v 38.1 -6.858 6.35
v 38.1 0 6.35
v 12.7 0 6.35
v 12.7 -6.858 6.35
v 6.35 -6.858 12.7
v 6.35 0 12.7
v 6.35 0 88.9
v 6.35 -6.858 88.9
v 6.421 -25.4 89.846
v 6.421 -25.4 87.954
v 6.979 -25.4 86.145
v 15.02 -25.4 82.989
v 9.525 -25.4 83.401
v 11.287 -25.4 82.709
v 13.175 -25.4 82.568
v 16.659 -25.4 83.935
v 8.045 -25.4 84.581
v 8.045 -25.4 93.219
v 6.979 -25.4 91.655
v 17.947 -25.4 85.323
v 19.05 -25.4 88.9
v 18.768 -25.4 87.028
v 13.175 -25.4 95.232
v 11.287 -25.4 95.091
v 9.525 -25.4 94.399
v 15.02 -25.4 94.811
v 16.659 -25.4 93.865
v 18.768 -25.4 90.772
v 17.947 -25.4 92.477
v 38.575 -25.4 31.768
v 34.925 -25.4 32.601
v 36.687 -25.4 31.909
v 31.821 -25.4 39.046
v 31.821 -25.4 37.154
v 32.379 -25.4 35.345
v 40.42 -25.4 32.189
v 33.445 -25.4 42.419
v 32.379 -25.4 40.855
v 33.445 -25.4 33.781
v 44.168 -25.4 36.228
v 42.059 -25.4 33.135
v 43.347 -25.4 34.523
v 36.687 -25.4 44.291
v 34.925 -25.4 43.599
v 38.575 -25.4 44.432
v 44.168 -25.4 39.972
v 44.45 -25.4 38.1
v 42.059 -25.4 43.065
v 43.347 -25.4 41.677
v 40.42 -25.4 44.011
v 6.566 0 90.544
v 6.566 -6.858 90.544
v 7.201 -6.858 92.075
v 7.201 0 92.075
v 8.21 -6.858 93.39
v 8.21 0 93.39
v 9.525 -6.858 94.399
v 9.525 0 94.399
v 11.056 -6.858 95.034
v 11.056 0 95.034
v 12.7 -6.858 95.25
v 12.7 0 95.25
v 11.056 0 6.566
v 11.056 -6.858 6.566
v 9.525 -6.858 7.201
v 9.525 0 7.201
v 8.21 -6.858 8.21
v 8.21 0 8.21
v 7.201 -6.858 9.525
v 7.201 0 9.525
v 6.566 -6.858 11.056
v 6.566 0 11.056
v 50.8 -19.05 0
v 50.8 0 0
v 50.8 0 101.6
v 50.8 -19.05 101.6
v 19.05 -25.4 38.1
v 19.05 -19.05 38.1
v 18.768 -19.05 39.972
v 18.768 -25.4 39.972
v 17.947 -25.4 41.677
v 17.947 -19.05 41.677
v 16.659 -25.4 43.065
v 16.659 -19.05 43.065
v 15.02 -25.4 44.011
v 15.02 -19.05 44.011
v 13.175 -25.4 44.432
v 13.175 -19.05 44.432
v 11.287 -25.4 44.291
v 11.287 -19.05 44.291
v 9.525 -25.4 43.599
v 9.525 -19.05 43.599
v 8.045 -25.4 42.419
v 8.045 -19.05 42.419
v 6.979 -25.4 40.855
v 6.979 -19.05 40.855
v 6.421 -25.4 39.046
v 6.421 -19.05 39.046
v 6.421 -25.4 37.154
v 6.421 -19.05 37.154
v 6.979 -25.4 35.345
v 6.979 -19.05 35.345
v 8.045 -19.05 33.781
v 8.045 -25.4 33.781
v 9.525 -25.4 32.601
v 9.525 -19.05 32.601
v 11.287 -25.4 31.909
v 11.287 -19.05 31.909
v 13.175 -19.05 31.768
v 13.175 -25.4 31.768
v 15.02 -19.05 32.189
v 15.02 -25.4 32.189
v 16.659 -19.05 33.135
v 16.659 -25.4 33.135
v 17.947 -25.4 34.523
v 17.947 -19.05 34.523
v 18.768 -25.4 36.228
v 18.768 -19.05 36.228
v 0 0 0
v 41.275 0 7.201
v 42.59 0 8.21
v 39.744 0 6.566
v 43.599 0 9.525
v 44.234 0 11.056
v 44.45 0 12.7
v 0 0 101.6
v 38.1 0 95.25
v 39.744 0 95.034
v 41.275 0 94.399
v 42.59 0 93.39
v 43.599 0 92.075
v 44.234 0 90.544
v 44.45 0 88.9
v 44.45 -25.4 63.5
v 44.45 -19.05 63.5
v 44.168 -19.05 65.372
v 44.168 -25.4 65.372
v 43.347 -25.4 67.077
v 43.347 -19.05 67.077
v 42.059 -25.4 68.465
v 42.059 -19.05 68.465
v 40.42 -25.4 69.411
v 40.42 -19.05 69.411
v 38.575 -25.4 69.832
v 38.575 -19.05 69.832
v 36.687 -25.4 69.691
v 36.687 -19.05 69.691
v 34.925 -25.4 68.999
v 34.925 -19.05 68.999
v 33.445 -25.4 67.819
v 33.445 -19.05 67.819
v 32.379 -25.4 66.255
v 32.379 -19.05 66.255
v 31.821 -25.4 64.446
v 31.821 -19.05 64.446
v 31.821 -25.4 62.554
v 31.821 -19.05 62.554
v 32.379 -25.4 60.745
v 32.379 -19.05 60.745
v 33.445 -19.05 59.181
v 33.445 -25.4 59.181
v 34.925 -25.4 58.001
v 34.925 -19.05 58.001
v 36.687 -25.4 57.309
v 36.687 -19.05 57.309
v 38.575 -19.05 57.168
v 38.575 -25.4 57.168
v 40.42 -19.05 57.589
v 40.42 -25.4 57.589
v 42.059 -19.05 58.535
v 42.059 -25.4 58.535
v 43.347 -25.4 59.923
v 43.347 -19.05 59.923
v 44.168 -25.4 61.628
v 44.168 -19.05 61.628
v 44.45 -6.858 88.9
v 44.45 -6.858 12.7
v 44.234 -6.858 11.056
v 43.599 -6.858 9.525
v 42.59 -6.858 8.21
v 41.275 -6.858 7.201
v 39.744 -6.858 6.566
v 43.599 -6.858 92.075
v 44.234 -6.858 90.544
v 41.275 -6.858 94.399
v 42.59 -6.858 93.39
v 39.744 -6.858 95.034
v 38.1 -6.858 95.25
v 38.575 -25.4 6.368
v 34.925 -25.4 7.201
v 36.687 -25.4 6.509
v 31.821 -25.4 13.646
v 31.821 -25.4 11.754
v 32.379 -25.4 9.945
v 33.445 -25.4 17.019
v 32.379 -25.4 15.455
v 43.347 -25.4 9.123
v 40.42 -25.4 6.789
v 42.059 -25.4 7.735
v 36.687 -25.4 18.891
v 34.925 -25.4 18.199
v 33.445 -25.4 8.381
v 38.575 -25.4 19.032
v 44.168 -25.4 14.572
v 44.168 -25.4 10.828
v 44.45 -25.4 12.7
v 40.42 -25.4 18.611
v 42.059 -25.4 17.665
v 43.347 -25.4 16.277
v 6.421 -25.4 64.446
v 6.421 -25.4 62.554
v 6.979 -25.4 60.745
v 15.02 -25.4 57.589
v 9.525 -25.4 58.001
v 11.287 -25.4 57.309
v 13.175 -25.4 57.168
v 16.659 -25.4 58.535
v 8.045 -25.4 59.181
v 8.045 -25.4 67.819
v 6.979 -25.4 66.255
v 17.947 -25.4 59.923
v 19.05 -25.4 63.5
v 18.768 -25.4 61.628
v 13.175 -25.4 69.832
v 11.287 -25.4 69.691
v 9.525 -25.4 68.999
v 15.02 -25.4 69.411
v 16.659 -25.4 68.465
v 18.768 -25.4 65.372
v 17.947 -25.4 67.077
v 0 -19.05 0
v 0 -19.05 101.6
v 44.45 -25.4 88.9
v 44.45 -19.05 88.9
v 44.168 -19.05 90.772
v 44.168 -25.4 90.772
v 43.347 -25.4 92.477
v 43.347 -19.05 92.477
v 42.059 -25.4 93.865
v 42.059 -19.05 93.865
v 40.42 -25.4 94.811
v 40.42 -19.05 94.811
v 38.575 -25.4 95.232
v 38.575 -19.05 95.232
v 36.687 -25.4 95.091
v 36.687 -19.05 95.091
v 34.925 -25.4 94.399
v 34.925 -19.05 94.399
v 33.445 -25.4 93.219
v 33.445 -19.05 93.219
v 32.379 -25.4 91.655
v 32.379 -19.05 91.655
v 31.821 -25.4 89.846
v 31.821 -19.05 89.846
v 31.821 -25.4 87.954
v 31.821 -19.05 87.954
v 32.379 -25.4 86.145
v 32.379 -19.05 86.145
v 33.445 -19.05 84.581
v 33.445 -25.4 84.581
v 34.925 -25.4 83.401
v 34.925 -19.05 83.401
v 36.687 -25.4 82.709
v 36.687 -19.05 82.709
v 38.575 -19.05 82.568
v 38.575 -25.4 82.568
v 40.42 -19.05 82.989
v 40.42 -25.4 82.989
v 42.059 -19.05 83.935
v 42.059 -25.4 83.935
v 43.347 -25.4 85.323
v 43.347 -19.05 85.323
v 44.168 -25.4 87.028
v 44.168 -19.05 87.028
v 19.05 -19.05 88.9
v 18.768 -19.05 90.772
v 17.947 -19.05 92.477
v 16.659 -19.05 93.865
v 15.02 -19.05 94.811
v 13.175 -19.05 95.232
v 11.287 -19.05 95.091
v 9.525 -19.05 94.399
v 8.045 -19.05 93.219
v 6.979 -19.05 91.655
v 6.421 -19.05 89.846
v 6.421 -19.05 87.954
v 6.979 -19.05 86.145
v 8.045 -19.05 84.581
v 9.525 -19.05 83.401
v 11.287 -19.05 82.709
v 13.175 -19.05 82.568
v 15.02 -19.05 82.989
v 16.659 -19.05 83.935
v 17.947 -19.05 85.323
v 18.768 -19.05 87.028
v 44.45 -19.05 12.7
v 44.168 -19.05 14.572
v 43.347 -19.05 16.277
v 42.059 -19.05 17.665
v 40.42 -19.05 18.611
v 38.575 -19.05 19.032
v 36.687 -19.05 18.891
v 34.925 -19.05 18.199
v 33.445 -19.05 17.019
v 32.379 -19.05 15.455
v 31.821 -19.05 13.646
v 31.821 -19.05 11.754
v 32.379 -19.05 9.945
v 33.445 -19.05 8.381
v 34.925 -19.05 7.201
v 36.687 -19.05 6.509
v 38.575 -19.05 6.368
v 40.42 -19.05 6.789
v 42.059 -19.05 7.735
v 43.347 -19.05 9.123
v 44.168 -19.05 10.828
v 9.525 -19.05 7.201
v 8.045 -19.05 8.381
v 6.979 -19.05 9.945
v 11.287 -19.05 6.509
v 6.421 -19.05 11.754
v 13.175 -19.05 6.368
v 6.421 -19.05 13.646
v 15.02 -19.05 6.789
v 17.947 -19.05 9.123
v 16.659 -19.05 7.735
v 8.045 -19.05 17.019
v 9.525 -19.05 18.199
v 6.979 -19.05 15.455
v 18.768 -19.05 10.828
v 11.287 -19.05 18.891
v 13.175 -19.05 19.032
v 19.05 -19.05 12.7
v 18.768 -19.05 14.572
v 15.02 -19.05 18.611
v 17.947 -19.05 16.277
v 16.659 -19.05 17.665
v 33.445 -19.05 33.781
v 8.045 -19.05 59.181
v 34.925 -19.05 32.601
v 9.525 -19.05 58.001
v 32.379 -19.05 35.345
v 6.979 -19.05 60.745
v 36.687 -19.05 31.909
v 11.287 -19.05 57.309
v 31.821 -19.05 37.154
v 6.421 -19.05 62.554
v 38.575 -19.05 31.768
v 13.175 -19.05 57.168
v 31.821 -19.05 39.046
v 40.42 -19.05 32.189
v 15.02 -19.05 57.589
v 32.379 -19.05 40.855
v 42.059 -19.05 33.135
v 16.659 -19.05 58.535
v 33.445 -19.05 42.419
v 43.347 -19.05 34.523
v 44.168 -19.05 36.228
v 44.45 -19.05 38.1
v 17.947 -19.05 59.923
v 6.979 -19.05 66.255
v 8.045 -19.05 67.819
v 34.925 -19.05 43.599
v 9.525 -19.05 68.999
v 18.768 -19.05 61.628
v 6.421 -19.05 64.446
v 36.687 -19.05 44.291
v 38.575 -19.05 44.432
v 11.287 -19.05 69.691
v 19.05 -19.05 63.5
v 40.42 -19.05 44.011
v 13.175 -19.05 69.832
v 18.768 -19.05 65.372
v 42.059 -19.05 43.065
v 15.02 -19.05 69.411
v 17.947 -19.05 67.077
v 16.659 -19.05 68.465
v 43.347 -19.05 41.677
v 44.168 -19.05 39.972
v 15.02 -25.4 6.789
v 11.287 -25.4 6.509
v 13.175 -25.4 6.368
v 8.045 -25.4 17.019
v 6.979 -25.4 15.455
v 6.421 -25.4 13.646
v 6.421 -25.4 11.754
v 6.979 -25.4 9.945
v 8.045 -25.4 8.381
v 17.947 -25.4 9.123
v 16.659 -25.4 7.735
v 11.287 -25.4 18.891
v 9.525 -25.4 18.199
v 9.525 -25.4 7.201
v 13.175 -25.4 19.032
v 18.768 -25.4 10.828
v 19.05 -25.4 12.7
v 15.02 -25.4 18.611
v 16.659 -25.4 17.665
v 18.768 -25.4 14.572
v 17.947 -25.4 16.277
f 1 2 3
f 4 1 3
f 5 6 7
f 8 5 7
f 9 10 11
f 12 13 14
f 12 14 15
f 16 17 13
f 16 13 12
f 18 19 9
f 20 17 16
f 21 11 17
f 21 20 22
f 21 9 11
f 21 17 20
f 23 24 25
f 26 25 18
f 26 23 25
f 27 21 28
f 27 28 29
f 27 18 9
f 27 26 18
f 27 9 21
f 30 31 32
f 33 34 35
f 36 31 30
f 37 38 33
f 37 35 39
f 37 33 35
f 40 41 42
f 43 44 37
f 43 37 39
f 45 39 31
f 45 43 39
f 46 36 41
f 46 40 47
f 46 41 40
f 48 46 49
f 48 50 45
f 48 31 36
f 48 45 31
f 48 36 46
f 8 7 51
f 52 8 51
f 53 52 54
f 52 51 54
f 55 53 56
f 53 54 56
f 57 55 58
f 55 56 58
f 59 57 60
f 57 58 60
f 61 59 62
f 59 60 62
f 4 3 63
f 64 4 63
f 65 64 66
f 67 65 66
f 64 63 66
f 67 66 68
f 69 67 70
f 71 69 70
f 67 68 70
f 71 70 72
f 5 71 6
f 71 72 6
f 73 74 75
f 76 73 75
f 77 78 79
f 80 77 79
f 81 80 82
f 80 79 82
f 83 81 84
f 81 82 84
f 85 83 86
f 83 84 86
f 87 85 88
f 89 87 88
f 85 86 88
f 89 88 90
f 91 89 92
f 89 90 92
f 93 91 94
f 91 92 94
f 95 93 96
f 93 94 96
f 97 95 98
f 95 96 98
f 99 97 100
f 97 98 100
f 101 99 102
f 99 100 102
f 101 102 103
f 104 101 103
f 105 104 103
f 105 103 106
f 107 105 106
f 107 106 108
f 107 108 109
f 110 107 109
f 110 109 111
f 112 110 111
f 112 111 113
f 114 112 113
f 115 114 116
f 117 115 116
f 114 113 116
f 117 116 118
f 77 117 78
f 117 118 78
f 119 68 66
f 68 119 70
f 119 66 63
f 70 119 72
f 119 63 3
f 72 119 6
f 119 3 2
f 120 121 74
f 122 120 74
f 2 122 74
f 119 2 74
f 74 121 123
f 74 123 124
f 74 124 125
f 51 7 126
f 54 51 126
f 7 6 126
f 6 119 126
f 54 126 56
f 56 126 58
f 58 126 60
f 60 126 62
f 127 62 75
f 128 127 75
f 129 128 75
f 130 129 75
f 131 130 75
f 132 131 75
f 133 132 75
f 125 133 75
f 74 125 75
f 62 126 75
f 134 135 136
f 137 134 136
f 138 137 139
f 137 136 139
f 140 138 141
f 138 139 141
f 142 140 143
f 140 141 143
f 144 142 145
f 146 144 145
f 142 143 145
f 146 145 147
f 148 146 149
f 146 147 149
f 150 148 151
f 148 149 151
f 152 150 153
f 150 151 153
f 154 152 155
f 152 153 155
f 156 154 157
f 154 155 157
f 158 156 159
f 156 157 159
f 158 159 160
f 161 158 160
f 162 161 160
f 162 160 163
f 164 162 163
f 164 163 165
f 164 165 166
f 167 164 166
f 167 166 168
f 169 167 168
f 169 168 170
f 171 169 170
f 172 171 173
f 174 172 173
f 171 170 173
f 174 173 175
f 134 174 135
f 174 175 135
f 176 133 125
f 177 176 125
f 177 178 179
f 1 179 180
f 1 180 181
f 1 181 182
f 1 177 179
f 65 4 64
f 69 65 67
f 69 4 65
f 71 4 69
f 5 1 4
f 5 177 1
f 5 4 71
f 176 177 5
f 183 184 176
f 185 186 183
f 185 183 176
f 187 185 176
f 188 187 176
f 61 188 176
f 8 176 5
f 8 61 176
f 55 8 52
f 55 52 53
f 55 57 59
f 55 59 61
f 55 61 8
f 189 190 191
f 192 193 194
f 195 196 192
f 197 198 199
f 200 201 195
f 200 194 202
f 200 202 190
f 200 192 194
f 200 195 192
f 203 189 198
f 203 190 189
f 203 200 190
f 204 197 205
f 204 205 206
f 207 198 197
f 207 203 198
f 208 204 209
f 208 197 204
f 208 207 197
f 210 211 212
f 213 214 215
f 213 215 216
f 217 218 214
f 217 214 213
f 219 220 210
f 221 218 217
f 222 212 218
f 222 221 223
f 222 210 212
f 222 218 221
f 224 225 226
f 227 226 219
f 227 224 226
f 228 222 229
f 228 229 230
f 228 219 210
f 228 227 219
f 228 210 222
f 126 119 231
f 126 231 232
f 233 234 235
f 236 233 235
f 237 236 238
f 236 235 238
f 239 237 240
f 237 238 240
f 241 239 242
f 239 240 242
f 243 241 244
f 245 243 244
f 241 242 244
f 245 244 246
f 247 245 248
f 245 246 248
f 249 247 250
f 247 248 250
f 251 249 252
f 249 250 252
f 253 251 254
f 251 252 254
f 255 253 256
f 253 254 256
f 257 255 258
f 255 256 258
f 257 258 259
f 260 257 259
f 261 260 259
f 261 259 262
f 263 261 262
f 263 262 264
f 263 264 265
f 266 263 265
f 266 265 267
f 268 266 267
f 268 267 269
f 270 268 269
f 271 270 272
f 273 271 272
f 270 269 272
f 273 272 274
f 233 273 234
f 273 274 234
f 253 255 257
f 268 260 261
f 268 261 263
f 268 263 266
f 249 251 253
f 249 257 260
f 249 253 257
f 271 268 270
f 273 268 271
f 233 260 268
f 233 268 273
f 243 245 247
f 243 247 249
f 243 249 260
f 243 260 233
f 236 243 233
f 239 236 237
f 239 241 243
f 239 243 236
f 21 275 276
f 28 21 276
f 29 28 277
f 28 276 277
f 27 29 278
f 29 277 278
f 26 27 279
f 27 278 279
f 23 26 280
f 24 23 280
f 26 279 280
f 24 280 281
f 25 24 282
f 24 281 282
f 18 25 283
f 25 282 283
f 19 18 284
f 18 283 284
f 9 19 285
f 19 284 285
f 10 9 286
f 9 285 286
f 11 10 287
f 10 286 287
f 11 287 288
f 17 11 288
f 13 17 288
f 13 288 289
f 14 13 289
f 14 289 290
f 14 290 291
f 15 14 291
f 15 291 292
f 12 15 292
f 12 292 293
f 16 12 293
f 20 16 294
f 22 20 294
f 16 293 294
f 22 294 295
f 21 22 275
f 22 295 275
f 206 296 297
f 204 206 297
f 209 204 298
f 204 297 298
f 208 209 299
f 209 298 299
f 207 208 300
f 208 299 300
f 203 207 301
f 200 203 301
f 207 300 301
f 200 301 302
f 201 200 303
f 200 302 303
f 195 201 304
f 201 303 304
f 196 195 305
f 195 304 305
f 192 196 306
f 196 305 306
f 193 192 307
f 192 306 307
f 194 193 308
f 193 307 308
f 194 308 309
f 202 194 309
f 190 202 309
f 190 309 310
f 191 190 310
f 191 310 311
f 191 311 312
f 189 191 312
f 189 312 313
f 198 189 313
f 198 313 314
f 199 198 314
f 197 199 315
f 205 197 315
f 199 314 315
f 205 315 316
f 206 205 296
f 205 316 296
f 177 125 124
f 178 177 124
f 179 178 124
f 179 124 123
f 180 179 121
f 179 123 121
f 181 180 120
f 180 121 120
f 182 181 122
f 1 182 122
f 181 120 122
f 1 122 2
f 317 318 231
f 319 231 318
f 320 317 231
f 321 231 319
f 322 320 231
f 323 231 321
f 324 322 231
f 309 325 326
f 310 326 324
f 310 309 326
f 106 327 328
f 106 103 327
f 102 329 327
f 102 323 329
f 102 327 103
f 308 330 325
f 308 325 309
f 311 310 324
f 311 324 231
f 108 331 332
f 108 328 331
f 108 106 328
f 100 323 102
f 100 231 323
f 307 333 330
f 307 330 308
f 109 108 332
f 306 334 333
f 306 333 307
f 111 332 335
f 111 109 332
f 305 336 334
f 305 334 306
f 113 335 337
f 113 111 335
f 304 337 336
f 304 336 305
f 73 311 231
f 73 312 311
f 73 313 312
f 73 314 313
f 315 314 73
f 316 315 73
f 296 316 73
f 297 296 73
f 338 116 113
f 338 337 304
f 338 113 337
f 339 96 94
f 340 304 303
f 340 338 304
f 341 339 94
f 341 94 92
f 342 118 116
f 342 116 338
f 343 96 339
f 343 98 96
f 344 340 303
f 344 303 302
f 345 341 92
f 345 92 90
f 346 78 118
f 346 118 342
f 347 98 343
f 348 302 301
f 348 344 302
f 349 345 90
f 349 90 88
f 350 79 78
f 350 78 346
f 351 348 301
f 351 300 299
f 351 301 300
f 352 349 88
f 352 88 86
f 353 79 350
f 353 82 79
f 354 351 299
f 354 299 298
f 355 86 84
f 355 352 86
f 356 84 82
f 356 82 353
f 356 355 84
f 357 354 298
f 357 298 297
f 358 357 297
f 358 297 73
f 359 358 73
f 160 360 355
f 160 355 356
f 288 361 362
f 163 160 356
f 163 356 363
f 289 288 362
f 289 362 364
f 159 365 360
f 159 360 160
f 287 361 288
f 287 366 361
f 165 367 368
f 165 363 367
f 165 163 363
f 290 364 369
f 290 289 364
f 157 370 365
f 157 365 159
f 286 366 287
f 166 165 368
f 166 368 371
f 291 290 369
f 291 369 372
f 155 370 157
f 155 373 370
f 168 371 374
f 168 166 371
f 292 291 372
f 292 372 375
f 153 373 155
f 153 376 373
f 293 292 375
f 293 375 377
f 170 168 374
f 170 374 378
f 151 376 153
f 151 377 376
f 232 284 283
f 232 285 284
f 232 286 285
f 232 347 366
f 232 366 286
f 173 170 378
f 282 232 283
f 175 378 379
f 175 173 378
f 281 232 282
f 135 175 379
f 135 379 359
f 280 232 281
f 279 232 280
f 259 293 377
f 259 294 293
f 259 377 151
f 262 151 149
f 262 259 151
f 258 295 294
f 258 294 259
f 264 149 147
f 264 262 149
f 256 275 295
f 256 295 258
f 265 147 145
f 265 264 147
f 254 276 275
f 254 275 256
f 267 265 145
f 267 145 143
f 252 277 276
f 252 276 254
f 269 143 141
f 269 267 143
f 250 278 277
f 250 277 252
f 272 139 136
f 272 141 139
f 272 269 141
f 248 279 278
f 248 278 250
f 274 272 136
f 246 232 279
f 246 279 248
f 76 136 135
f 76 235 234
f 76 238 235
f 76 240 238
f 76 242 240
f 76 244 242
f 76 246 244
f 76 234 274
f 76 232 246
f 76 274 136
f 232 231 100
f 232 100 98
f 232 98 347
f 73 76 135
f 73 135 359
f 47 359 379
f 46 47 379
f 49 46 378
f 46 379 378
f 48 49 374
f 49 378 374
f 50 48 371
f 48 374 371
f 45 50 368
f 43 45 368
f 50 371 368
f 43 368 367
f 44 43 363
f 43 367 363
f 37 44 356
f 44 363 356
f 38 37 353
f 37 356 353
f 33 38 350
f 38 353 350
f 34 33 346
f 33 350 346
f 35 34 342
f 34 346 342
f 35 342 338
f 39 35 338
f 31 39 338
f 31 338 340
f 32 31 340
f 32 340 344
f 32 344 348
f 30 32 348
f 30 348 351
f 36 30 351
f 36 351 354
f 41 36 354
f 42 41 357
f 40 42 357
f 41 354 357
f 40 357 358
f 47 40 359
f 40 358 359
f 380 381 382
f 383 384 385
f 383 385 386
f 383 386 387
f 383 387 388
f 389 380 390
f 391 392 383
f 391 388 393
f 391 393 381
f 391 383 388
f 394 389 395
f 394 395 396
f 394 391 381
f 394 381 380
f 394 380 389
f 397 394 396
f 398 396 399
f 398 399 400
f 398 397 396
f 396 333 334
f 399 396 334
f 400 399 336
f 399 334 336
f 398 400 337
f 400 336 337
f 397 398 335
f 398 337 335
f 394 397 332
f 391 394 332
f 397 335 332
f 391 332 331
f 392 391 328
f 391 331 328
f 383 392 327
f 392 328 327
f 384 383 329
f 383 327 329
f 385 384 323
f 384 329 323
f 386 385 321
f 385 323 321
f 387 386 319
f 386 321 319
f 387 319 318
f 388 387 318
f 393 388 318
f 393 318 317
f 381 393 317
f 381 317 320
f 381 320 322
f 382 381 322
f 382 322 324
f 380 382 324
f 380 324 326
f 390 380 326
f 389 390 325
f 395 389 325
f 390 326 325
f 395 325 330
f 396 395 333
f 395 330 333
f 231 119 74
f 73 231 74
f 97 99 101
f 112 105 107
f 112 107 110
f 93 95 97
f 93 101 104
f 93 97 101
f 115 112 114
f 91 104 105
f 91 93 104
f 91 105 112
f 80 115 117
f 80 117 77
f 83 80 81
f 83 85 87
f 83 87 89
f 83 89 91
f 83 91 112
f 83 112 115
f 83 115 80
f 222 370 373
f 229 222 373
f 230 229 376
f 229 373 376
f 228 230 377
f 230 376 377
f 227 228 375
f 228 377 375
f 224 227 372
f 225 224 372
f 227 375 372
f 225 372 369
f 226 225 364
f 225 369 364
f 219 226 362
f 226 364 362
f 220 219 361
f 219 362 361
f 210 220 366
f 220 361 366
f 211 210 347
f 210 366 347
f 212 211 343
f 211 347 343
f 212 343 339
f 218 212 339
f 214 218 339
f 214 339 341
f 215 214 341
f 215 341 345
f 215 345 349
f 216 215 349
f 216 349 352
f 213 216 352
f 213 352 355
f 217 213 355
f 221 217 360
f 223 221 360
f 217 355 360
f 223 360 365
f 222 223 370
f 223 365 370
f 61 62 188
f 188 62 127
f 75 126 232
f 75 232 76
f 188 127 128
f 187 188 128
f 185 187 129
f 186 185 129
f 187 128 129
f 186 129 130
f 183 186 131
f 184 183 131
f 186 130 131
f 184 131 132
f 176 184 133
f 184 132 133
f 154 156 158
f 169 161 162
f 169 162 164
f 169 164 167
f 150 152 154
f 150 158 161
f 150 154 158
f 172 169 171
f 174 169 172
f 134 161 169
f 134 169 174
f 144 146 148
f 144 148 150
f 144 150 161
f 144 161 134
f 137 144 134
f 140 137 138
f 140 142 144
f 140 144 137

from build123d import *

# Parameters (mm, degrees)
F0_W     = 50.8
F0_H     = 101.6
F1_DEPTH = 19.05
F2_R     = 6.35
F3_DEPTH = 6.35
F5_DEPTH = 6.858


with BuildPart() as f1:
    # F0 (on Front) → F1 (new body)
    with BuildSketch(Plane.XZ):
        with Locations((25.4, 50.8)):
            Rectangle(F0_W, F0_H)
    extrude(amount=F1_DEPTH)

    # F2 (on face) → F3 (join)
    with BuildSketch(Plane.XZ.offset(19.05)):
        with Locations((12.7, 88.9)):
            Circle(F2_R)
        with Locations((38.1, 88.9)):
            Circle(F2_R)
        with Locations((12.7, 63.5)):
            Circle(F2_R)
        with Locations((38.1, 63.5)):
            Circle(F2_R)
        with Locations((12.7, 38.1)):
            Circle(F2_R)
        with Locations((38.1, 38.1)):
            Circle(F2_R)
        with Locations((12.7, 12.7)):
            Circle(F2_R)
        with Locations((38.1, 12.7)):
            Circle(F2_R)
    extrude(amount=F3_DEPTH)

    # F4 (on face) → F5 (cut)
    with BuildSketch(Plane(origin=(0, 0, 0), x_dir=(-1, 0, 0), z_dir=(0, 1, 0))):
        with BuildLine():
            Line((-12.7, 95.25), (-38.1, 95.25))
            ThreePointArc((-38.1, 95.25), (-42.590128, 93.390128), (-44.45, 88.9))
            Line((-44.45, 88.9), (-44.45, 12.7))
            ThreePointArc((-44.45, 12.7), (-42.590128, 8.209872), (-38.1, 6.35))
            Line((-38.1, 6.35), (-12.7, 6.35))
            ThreePointArc((-12.7, 6.35), (-8.209872, 8.209872), (-6.35, 12.7))
            Line((-6.35, 12.7), (-6.35, 88.9))
            ThreePointArc((-6.35, 88.9), (-8.209872, 93.390128), (-12.7, 95.25))
        make_face()
    extrude(amount=-F5_DEPTH, mode=Mode.SUBTRACT)


solid = f1.part
